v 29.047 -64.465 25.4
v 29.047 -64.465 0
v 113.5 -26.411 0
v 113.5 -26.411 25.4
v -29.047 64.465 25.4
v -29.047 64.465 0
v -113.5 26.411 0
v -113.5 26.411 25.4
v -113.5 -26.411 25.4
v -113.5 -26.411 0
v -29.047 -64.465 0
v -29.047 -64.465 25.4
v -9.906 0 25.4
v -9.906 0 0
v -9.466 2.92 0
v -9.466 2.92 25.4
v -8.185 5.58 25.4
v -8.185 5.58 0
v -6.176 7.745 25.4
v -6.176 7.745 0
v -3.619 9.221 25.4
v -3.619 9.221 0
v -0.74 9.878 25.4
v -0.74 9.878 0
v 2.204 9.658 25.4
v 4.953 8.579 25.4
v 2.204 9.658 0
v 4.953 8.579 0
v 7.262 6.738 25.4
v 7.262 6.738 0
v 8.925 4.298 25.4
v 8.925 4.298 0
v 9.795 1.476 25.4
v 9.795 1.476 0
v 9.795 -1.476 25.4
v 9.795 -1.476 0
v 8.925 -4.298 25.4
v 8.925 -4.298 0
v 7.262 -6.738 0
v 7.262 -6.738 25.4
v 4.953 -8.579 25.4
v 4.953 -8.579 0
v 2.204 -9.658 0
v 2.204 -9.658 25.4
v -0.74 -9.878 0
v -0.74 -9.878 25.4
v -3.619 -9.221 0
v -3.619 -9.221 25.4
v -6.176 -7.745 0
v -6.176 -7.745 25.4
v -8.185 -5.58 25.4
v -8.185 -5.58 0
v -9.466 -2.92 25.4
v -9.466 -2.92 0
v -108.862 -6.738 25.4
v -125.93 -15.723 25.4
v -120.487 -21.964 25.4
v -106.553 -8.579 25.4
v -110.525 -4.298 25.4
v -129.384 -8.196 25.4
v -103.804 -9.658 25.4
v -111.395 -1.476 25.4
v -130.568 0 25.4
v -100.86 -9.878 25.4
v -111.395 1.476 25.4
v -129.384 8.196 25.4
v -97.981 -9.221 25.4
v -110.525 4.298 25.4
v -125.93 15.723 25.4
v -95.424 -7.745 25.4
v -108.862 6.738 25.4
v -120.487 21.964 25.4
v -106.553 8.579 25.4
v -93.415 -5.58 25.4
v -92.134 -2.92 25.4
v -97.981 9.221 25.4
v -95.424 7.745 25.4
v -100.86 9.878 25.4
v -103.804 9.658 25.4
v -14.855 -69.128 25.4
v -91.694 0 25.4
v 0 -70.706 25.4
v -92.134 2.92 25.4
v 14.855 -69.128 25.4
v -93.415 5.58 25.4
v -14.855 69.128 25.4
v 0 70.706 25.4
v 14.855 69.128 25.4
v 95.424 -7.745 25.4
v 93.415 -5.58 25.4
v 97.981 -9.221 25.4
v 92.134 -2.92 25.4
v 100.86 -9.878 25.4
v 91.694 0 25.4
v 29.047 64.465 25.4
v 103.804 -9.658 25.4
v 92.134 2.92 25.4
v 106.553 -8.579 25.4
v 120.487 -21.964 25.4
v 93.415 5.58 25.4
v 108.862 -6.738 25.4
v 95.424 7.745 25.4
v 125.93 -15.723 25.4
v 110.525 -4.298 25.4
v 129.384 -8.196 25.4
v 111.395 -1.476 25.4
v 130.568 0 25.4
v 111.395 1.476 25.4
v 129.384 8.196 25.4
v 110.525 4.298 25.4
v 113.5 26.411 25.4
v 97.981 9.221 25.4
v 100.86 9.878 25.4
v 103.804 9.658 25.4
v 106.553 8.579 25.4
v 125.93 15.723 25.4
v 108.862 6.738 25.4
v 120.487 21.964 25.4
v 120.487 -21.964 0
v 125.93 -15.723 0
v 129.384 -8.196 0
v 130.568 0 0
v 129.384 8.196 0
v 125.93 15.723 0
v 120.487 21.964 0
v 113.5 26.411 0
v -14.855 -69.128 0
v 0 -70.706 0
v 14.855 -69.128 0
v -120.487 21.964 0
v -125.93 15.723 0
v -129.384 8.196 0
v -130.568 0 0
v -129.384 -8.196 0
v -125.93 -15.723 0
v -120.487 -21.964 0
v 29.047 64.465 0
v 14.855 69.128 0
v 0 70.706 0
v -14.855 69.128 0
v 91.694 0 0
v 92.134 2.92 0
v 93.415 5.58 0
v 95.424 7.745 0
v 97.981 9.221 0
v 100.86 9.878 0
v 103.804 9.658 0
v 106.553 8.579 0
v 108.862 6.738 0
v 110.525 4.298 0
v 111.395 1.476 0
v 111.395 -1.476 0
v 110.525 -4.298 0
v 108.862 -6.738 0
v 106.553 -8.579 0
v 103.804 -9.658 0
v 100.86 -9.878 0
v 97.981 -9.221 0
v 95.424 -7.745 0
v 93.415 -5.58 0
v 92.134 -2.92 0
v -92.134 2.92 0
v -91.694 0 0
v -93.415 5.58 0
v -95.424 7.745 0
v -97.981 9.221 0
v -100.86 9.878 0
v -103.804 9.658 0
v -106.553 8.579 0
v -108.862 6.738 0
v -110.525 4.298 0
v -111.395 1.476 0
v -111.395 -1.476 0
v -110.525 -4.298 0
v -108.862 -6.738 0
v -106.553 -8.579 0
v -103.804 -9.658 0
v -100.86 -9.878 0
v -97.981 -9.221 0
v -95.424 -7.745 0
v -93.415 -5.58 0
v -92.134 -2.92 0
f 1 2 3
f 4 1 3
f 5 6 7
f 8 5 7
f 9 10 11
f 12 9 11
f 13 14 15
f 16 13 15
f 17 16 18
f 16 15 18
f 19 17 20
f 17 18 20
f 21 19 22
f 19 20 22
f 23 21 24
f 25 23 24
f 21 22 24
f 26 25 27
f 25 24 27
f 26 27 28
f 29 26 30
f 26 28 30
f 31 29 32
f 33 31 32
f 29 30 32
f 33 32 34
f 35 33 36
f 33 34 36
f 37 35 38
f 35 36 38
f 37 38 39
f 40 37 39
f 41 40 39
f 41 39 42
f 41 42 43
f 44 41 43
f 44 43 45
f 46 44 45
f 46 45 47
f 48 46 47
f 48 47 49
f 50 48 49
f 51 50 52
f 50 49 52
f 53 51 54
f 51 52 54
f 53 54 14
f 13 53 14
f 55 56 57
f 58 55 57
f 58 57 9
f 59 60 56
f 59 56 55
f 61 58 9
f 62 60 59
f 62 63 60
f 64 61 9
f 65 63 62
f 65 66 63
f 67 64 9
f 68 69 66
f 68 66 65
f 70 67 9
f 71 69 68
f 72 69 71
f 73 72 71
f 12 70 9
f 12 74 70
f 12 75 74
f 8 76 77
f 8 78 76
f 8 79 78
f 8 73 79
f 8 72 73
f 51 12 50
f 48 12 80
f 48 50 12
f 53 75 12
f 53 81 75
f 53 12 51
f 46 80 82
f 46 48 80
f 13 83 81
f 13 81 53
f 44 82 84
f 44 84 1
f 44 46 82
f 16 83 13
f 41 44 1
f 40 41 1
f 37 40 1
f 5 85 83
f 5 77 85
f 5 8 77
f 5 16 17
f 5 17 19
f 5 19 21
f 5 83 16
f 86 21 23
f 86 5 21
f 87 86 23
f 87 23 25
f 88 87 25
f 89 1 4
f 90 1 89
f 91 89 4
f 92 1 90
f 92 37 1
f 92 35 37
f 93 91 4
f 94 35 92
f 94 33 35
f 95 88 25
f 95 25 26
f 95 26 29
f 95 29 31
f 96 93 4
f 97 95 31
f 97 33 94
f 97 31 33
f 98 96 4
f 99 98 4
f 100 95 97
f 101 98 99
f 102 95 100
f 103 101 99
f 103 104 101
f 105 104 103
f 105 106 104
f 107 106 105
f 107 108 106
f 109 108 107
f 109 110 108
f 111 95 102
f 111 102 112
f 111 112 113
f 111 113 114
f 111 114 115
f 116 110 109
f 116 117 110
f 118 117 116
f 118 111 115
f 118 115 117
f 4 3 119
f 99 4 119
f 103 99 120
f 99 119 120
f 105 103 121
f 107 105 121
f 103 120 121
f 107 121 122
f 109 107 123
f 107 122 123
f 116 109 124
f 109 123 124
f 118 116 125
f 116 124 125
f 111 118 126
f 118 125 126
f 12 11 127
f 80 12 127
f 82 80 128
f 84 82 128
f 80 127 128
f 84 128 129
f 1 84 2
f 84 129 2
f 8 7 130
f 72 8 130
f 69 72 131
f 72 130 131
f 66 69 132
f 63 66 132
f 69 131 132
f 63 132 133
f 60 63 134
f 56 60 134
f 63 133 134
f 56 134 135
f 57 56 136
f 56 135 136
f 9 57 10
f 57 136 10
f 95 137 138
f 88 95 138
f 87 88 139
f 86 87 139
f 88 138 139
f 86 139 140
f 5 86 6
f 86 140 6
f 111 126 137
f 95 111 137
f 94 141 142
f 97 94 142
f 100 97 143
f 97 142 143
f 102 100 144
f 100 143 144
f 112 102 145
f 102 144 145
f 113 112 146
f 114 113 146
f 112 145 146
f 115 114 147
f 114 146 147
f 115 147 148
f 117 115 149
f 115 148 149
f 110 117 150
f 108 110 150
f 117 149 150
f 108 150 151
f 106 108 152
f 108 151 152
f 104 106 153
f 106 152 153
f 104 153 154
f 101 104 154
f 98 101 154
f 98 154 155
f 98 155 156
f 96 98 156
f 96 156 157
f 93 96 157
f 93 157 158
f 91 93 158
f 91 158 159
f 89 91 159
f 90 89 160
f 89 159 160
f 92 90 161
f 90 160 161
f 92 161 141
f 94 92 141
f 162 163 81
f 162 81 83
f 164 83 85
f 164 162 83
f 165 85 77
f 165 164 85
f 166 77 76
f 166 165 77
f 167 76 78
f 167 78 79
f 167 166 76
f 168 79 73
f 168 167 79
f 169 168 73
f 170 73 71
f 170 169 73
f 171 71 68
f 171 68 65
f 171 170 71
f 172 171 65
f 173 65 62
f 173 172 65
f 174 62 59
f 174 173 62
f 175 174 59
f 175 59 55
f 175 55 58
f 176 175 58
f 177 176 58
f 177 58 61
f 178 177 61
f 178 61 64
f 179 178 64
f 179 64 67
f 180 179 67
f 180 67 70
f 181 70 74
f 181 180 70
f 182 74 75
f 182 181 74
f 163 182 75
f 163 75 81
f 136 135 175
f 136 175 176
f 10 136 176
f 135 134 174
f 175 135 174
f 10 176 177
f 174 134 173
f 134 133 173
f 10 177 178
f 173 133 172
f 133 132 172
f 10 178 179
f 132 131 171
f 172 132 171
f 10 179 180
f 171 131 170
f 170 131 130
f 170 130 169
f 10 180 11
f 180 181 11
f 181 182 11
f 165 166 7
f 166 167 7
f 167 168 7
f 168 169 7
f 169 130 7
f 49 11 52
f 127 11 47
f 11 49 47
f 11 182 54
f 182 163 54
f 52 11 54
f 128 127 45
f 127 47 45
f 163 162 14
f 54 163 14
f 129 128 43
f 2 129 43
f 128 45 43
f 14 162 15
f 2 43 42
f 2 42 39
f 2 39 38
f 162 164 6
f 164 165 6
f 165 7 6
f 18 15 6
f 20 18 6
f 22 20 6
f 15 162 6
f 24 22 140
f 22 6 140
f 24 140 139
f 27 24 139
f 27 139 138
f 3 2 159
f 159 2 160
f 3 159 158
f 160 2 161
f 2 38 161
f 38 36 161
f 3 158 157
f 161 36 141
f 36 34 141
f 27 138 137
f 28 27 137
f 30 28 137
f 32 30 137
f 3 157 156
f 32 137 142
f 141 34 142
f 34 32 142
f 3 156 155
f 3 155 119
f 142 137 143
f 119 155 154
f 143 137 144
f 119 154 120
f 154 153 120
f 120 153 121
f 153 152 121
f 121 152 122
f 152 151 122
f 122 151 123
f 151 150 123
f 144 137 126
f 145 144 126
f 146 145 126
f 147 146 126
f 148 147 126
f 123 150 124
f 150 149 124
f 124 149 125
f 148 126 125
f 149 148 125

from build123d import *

# Parameters (mm, degrees)
F0_R     = 13.9065
F0_R_2   = 9.906
F1_DEPTH = 25.4


with BuildPart() as f1:
    # F0 (on Top) → F1 (new body)
    with BuildSketch(Plane.XY):
        with BuildLine():
            Line((70.7064372, 0), (64.77, 0))
            ThreePointArc((64.77, 0), (0, -64.77), (-64.77, 0))
            Line((-64.77, 0), (-70.7064372, 0))
            ThreePointArc((-70.7064372, 0), (-59.3851891605, -38.3770708873), (-29.0468761129, -64.4645580889))
            ThreePointArc((-29.0468761129, -64.4645580889), (0, -70.7064372), (29.0468761129, -64.4645580889))
            ThreePointArc((29.0468761129, -64.4645580889), (59.3851891605, -38.3770708873), (70.7064372, 0))
        make_face()
        with BuildLine():
            ThreePointArc((-64.77, 0), (0, 64.77), (64.77, 0))
            Line((64.77, 0), (70.7064372, 0))
            ThreePointArc((70.7064372, 0), (59.3851891605, 38.3770708873), (29.0468761129, 64.4645580889))
            ThreePointArc((29.0468761129, 64.4645580889), (0, 70.7064372), (-29.0468761129, 64.4645580889))
            ThreePointArc((-29.0468761129, 64.4645580889), (-59.3851891605, 38.3770708873), (-70.7064372, 0))
            Line((-70.7064372, 0), (-64.77, 0))
        make_face()
        with BuildLine():
            Line((72.631808, 0), (70.7064372, 0))
            ThreePointArc((70.7064372, 0), (59.3851891605, -38.3770708873), (29.0468761129, -64.4645580889))
            Line((29.0468761129, -64.4645580889), (113.5004084714, -26.410914902))
            ThreePointArc((113.5004084714, -26.410914902), (85.8770417817, -24.3299143569), (72.631808, 0))
        make_face()
        with BuildLine():
            ThreePointArc((29.0468761129, 64.4645580889), (59.3851891605, 38.3770708873), (70.7064372, 0))
            Line((70.7064372, 0), (72.631808, 0))
            ThreePointArc((72.631808, 0), (85.8770417817, 24.3299143569), (113.5004084714, 26.410914902))
            Line((113.5004084714, 26.410914902), (29.0468761129, 64.4645580889))
        make_face()
        with BuildLine():
            Line((-72.631808, 0), (-70.7064372, 0))
            ThreePointArc((-70.7064372, 0), (-59.3851891605, 38.3770708873), (-29.0468761129, 64.4645580889))
            Line((-29.0468761129, 64.4645580889), (-113.5004084714, 26.410914902))
            ThreePointArc((-113.5004084714, 26.410914902), (-85.8770417817, 24.3299143569), (-72.631808, 0))
        make_face()
        with BuildLine():
            ThreePointArc((-29.0468761129, -64.4645580889), (-59.3851891605, -38.3770708873), (-70.7064372, 0))
            Line((-70.7064372, 0), (-72.631808, 0))
            ThreePointArc((-72.631808, 0), (-85.8770417817, -24.3299143569), (-113.5004084714, -26.410914902))
            Line((-113.5004084714, -26.410914902), (-29.0468761129, -64.4645580889))
        make_face()
        with BuildLine():
            ThreePointArc((113.5004084714, 26.410914902), (85.8770417817, 24.3299143569), (72.631808, 0))
            ThreePointArc((72.631808, 0), (85.8770417817, -24.3299143569), (113.5004084714, -26.410914902))
            ThreePointArc((113.5004084714, -26.410914902), (125.9299143569, -15.7229582183), (130.568192, 0))
            ThreePointArc((130.568192, 0), (125.9299143569, 15.7229582183), (113.5004084714, 26.410914902))
        make_face()
        with BuildLine():
            ThreePointArc((115.5065, 0), (101.6, -13.9065), (87.6935, 0))
            ThreePointArc((87.6935, 0), (101.6, 13.9065), (115.5065, 0))
        make_face(mode=Mode.SUBTRACT)
        with BuildLine():
            ThreePointArc((-113.5004084714, -26.410914902), (-85.8770417817, -24.3299143569), (-72.631808, 0))
            ThreePointArc((-72.631808, 0), (-85.8770417817, 24.3299143569), (-113.5004084714, 26.410914902))
            ThreePointArc((-113.5004084714, 26.410914902), (-130.568192, 0), (-113.5004084714, -26.410914902))
        make_face()
        with Locations((-101.6, 0)):
            Circle(F0_R, mode=Mode.SUBTRACT)
        with BuildLine():
            ThreePointArc((-64.77, 0), (0, -64.77), (64.77, 0))
            Line((64.77, 0), (9.906, 0))
            ThreePointArc((9.906, 0), (0, -9.906), (-9.906, 0))
            Line((-9.906, 0), (-64.77, 0))
        make_face()
        with BuildLine():
            Line((9.906, 0), (64.77, 0))
            ThreePointArc((64.77, 0), (0, 64.77), (-64.77, 0))
            Line((-64.77, 0), (-9.906, 0))
            ThreePointArc((-9.906, 0), (0, 9.906), (9.906, 0))
        make_face()
        with BuildLine():
            ThreePointArc((115.5065, 0), (101.6, 13.9065), (87.6935, 0))
            ThreePointArc((87.6935, 0), (101.6, -13.9065), (115.5065, 0))
        make_face()
        with BuildLine():
            ThreePointArc((111.506, 0), (101.6, -9.906), (91.694, 0))
            ThreePointArc((91.694, 0), (101.6, 9.906), (111.506, 0))
        make_face(mode=Mode.SUBTRACT)
        with Locations((-101.6, 0)):
            Circle(F0_R)
        with Locations((-101.6, 0)):
            Circle(F0_R_2, mode=Mode.SUBTRACT)
    extrude(amount=F1_DEPTH)


solid = f1.part
